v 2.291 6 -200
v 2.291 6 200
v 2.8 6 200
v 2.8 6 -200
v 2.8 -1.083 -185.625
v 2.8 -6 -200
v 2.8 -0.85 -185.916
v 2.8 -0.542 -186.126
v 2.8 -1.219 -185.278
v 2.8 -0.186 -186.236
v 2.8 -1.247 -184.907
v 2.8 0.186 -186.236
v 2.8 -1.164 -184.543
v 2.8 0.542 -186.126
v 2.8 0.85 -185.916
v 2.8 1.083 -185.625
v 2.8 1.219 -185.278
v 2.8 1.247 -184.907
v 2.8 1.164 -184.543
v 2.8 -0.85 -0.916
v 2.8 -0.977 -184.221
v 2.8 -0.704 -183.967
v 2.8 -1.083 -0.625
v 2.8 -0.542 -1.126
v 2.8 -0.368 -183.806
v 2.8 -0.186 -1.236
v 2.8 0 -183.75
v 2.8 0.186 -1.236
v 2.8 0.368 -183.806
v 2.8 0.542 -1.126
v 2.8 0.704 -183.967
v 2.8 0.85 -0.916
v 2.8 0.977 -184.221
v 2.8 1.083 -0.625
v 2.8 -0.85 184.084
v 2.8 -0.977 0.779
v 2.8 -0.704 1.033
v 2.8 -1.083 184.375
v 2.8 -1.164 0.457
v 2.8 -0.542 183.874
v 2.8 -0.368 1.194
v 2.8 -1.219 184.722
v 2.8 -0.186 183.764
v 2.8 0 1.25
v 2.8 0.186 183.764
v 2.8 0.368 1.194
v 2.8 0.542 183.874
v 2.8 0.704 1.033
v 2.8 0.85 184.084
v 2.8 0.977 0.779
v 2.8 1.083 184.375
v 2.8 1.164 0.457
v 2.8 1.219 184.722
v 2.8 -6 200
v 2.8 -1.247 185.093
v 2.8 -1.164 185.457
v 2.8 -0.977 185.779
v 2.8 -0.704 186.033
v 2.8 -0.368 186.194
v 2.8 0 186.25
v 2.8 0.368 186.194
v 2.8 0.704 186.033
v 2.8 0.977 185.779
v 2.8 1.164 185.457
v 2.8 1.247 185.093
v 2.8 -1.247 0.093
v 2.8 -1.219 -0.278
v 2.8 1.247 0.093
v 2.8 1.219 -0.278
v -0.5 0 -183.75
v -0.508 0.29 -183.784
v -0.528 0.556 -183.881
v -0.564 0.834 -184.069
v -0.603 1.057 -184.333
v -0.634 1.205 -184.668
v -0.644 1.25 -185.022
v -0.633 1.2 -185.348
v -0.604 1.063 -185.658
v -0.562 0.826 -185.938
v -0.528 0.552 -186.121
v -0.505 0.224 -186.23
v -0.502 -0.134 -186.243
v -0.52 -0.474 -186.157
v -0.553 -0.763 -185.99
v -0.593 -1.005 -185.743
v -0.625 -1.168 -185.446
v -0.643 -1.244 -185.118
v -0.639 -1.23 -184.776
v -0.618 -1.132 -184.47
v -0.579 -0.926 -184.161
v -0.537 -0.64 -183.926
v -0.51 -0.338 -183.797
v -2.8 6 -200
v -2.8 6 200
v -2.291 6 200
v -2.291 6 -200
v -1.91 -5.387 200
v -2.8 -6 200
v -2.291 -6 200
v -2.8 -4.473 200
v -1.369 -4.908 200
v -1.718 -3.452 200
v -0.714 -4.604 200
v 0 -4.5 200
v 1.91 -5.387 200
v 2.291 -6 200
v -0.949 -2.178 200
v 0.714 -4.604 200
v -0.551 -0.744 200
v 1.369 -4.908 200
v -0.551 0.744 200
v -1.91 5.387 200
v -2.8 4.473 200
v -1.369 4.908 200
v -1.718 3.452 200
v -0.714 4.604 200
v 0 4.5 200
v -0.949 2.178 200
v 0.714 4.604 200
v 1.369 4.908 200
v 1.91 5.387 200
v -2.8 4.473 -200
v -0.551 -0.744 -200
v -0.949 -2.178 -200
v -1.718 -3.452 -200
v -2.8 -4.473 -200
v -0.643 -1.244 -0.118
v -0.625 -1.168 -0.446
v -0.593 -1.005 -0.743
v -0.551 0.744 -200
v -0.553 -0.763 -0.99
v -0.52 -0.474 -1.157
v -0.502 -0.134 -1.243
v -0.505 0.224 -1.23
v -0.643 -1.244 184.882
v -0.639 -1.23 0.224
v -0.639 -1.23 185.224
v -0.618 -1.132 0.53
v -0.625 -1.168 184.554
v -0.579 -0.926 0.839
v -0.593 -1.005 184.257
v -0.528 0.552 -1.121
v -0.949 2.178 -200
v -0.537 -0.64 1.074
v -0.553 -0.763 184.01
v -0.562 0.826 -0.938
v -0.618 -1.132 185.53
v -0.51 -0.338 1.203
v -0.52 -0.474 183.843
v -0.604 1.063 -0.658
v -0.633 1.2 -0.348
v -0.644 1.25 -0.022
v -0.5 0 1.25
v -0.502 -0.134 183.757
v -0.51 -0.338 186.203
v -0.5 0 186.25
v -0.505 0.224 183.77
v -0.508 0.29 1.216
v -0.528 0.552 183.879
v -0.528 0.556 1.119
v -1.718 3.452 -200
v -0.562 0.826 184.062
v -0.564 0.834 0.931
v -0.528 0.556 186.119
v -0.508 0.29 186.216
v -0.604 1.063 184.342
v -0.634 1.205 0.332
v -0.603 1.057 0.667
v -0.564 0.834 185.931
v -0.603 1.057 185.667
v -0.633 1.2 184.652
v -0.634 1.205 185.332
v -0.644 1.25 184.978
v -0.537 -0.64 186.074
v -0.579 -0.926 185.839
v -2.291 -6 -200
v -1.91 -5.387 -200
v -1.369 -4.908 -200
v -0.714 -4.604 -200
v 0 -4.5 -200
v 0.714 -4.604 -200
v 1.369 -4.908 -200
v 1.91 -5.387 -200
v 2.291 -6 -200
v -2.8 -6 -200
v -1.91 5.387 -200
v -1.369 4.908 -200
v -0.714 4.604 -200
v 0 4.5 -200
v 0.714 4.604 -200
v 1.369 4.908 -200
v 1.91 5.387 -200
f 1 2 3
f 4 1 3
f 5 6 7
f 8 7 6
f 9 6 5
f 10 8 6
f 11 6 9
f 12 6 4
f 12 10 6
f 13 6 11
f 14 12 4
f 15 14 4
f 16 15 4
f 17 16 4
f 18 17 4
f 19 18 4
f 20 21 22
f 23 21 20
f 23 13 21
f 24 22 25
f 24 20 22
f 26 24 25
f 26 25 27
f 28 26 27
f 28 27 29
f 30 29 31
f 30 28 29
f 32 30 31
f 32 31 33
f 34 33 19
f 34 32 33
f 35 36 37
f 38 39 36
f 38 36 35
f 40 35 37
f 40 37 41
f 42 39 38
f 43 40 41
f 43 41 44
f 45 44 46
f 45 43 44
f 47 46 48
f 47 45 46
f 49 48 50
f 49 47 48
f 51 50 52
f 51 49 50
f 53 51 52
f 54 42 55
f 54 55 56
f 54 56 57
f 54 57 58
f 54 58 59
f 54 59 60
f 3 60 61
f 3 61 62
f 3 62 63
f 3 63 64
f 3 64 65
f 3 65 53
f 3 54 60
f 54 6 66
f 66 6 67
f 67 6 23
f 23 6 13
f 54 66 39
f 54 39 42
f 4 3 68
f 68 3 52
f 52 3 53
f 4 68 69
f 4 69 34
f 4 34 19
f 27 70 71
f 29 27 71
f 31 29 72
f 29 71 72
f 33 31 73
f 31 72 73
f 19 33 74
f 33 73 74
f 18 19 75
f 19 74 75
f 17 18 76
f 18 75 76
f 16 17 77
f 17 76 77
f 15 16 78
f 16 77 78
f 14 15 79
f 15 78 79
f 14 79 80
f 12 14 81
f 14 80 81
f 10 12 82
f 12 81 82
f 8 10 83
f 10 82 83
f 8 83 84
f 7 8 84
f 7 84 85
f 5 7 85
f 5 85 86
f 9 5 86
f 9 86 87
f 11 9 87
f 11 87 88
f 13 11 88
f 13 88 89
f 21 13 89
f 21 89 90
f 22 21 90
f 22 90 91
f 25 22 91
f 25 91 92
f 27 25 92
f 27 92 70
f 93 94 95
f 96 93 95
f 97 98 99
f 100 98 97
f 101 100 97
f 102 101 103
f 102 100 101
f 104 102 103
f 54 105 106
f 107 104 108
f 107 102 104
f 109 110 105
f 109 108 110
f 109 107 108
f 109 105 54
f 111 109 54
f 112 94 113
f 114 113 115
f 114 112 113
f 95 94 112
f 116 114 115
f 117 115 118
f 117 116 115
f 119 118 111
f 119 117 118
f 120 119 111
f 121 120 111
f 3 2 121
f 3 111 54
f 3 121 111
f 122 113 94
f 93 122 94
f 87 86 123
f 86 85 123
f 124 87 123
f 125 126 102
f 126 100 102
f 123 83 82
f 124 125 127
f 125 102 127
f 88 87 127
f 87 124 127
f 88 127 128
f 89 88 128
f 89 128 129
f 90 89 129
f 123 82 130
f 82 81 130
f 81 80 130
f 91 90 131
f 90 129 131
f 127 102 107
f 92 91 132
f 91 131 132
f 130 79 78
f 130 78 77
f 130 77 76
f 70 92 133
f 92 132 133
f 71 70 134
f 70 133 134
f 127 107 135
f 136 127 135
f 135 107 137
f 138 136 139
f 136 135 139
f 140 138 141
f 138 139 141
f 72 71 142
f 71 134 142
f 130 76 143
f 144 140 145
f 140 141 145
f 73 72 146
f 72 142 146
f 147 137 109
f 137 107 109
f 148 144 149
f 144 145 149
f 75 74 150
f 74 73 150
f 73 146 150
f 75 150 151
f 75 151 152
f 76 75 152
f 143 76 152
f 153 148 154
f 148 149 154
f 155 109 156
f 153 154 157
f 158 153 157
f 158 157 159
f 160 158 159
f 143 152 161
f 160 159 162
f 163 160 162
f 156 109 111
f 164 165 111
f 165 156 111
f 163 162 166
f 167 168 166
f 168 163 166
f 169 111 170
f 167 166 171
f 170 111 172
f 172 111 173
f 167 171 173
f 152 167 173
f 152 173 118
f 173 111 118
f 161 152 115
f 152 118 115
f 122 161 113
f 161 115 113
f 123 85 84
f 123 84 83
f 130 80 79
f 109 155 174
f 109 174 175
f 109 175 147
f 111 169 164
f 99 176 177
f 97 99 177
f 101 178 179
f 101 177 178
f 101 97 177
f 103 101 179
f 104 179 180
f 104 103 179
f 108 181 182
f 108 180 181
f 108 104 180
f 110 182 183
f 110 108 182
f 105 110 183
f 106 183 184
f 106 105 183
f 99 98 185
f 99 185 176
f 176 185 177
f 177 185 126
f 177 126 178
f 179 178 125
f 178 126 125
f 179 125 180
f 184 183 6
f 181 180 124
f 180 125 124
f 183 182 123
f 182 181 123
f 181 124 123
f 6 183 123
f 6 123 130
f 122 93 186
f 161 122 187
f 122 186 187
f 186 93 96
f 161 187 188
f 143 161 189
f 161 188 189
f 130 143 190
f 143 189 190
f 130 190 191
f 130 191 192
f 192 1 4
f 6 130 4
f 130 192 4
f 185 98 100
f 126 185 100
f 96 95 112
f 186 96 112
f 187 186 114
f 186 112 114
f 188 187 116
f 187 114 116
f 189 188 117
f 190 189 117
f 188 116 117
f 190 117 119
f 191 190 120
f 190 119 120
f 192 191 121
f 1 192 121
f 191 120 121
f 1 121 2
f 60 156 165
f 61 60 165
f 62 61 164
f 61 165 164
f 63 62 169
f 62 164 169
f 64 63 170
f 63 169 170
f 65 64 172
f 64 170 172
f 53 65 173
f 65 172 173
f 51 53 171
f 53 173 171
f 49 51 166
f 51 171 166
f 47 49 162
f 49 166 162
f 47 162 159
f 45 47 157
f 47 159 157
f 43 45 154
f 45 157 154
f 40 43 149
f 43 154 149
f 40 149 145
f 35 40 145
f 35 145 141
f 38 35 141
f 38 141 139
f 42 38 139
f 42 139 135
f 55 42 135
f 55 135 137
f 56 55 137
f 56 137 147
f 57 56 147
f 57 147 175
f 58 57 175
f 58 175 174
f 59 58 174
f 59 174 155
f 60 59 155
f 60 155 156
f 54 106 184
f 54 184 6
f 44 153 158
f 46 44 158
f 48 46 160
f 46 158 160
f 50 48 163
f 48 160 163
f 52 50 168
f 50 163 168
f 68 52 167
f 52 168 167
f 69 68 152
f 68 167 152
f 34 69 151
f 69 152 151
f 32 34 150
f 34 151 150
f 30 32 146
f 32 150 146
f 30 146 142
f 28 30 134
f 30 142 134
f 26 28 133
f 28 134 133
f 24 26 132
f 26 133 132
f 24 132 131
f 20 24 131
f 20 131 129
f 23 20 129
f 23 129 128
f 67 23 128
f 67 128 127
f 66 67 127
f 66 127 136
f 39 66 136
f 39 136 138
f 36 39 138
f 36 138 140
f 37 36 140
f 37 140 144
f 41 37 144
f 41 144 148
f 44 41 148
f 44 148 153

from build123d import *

# Parameters (mm, degrees)
SKETCH_1_W          = 5.6
SKETCH_1_H          = 12
EXTRUDE_1_DEPTH     = 200
SKETCH_2_R          = 2.5
CUT_EXTRUDE_1_DEPTH = 230
SKETCH_3_R          = 5.5
CUT_EXTRUDE_2_DEPTH = 690
HOLE_WIZARD_M3_1_D  = 2.5


with BuildPart() as part:
    # 草图1 → 凸台-拉伸1 (new, symmetric)
    with BuildSketch(Plane.XY):
        Rectangle(SKETCH_1_W, SKETCH_1_H)
    extrude(amount=EXTRUDE_1_DEPTH, both=True)

    # 草图2 → 切除-拉伸1 (cut, symmetric)
    with BuildSketch(Plane.XY):
        with Locations((0, 7)):
            Circle(SKETCH_2_R)
    cut_extrude_1 = extrude(amount=CUT_EXTRUDE_1_DEPTH, both=True, mode=Mode.SUBTRACT)

    # 镜向1: 切除-拉伸1 across plane
    add(cut_extrude_1.mirror(Plane.ZX), mode=Mode.SUBTRACT)

    # 草图3 → 切除-拉伸2 (cut, symmetric)
    with BuildSketch(Plane.XY.offset(200)):
        with Locations((-6, 0)):
            Circle(SKETCH_3_R)
    extrude(amount=CUT_EXTRUDE_2_DEPTH, both=True, mode=Mode.SUBTRACT)

    # M3 螺纹孔1 (through all)
    with Locations(Plane(origin=(2.8, 0, 0), x_dir=(0, 0, -1), z_dir=(1, 0, 0))):
        with Locations((-185, 0), (0, 0), (185, 0)):
            Hole(HOLE_WIZARD_M3_1_D / 2)


solid = part.part
